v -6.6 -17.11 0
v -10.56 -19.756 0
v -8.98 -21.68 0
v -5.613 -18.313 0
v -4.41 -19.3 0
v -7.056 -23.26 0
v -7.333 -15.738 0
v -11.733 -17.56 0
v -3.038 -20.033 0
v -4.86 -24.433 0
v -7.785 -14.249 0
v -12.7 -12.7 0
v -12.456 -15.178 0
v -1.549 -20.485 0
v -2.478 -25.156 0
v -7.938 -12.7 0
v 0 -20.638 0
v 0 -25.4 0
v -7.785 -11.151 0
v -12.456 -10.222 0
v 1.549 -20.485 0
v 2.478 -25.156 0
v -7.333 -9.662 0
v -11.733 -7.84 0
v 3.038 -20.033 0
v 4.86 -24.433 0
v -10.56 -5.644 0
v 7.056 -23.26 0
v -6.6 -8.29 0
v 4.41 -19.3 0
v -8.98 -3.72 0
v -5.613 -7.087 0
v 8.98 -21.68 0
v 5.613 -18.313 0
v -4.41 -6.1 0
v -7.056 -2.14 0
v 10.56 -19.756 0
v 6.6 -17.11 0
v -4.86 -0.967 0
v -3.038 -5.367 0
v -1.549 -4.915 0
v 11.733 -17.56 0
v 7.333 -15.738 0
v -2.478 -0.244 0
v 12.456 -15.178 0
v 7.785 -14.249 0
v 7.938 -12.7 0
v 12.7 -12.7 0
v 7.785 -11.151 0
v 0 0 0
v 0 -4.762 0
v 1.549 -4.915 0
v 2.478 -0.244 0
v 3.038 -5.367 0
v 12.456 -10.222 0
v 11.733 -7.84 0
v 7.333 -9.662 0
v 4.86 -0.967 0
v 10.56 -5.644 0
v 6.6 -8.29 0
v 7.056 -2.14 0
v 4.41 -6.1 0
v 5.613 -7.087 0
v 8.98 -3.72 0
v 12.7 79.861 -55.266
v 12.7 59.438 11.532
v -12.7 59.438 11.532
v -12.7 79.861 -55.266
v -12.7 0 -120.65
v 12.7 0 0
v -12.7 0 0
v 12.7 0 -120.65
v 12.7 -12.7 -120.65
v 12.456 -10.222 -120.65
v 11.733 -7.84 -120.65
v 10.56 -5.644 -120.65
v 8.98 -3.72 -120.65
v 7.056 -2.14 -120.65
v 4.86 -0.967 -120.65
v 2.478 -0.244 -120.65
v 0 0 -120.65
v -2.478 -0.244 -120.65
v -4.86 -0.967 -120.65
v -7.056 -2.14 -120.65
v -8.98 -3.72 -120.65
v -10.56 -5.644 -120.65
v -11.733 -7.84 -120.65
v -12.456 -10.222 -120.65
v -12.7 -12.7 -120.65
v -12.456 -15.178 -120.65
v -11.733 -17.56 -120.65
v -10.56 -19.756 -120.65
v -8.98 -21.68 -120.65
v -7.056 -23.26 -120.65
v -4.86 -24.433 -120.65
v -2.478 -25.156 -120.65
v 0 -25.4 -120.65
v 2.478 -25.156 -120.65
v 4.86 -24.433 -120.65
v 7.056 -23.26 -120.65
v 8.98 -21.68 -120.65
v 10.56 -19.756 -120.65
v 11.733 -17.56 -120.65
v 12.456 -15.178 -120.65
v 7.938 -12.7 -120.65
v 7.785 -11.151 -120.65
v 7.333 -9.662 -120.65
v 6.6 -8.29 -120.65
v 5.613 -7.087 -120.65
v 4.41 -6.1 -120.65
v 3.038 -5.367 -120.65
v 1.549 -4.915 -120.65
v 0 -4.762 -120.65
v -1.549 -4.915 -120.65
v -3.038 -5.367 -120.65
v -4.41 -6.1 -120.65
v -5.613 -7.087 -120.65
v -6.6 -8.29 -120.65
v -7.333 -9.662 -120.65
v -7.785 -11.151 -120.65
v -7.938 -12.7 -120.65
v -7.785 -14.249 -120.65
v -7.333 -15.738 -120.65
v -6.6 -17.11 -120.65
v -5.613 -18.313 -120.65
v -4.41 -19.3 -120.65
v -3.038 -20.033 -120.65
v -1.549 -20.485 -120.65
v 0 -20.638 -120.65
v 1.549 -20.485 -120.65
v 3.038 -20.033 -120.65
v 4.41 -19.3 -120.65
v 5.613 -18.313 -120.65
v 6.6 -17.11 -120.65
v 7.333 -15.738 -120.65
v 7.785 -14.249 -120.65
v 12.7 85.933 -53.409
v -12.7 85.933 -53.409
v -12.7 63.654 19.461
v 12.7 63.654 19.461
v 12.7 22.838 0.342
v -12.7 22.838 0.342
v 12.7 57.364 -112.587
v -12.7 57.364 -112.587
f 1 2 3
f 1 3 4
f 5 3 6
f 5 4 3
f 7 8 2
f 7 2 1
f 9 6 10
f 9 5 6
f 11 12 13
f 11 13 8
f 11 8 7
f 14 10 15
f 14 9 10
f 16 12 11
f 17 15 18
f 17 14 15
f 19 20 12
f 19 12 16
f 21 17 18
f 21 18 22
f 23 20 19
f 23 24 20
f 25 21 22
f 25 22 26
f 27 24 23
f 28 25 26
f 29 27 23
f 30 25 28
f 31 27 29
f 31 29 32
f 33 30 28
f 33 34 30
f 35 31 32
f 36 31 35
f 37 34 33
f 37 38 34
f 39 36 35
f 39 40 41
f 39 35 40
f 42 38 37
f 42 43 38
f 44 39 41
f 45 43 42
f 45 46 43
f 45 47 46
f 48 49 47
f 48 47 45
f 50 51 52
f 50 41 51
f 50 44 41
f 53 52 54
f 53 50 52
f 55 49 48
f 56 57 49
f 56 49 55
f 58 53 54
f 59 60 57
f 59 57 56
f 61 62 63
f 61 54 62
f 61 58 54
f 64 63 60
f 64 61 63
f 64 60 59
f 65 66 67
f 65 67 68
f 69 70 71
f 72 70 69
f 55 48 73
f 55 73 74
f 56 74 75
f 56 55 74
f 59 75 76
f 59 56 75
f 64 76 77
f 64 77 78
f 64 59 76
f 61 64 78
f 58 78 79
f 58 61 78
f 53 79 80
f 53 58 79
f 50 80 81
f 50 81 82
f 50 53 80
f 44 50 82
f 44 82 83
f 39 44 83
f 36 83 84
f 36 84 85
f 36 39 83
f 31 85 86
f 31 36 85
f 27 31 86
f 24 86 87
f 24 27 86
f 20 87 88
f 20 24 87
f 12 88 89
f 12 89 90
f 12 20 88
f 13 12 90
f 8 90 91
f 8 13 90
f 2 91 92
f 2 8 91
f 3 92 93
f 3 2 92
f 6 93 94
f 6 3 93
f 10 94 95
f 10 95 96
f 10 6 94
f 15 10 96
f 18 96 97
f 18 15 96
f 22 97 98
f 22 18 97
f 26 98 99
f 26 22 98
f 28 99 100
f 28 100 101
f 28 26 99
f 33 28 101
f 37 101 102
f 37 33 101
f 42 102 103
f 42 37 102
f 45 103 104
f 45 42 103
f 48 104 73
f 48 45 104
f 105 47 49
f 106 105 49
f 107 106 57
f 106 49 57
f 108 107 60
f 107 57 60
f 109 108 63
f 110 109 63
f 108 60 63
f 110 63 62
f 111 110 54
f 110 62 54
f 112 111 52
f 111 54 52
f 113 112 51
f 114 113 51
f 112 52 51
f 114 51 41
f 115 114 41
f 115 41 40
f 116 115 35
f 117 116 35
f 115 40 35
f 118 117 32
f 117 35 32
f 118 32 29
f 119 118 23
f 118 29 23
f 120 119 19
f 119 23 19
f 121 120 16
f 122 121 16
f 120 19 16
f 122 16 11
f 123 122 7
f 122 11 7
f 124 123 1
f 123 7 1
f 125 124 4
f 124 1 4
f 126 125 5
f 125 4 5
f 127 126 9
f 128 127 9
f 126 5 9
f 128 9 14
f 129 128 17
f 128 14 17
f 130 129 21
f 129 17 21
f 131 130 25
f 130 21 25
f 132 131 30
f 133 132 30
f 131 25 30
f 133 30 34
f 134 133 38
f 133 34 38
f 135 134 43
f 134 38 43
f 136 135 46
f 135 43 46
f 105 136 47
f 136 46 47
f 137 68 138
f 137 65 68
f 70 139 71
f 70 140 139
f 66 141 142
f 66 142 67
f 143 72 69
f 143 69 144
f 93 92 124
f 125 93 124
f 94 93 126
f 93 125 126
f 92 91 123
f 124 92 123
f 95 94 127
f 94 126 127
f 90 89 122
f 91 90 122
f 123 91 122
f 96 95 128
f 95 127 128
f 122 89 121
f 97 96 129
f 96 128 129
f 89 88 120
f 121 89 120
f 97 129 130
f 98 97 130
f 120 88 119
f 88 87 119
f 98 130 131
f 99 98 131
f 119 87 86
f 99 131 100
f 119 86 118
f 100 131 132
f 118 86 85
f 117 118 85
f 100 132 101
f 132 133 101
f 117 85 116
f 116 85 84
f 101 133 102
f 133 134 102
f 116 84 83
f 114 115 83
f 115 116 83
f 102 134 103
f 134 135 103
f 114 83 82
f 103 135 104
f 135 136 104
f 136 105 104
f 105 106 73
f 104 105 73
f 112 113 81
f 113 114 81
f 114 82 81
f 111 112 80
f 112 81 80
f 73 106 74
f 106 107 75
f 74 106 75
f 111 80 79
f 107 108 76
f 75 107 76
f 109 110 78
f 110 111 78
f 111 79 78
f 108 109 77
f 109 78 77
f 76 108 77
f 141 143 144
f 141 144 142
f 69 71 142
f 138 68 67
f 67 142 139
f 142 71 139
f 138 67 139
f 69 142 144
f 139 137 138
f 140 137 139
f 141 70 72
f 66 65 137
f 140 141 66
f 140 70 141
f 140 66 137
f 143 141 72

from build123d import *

# Parameters (mm, degrees)
F1_R     = 12.7
F1_R_2   = 7.9375
F2_DEPTH = 120.65
F3_DEPTH = 12.7
F6_DEPTH = 12.7


with BuildPart() as f2:
    # F1 (on Top) → F2 (new body)
    with BuildSketch(Plane.XY):
        with Locations((0, -12.7)):
            Circle(F1_R)
        with Locations((0, -12.7)):
            Circle(F1_R_2, mode=Mode.SUBTRACT)
    extrude(amount=-F2_DEPTH)


with BuildPart() as f3:
    # F0 (on Right) → F3 (new body, symmetric)
    with BuildSketch(Plane.YZ):
        Polygon((97.6843618562, -152.4), (50.8, 0), (0, 0), (0, -152.4), align=None)
        Polygon((0, 0), (50.8, 0), (40.5959168923, 31.3409897747), align=None)
        Polygon((40.5959168923, 31.3409897747), (50.8, 0), (99.3542851518, 14.9372485218), (136.6974064563, -106.4484643576), (185.251691608, -91.5112158358), (165.7442559226, -28.1013051372), (113.4819560317, 57.5799615131), align=None)
    extrude(amount=F3_DEPTH, both=True)


with BuildPart() as f6:
    # F5 (on Right) → F6 (new body, symmetric)
    with BuildSketch(Plane.YZ):
        Polygon((63.6543548718, 19.4610892928), (0, 0), (0, -120.65), (57.3637361695, -112.587100946), (22.8378207674, 0.3420798526), (59.4383799965, 11.5319937674), (79.8605435713, -55.2658934366), (85.9330787717, -53.4093331116), align=None)
    extrude(amount=F6_DEPTH, both=True)


solid = Compound([f2.part, f6.part])
